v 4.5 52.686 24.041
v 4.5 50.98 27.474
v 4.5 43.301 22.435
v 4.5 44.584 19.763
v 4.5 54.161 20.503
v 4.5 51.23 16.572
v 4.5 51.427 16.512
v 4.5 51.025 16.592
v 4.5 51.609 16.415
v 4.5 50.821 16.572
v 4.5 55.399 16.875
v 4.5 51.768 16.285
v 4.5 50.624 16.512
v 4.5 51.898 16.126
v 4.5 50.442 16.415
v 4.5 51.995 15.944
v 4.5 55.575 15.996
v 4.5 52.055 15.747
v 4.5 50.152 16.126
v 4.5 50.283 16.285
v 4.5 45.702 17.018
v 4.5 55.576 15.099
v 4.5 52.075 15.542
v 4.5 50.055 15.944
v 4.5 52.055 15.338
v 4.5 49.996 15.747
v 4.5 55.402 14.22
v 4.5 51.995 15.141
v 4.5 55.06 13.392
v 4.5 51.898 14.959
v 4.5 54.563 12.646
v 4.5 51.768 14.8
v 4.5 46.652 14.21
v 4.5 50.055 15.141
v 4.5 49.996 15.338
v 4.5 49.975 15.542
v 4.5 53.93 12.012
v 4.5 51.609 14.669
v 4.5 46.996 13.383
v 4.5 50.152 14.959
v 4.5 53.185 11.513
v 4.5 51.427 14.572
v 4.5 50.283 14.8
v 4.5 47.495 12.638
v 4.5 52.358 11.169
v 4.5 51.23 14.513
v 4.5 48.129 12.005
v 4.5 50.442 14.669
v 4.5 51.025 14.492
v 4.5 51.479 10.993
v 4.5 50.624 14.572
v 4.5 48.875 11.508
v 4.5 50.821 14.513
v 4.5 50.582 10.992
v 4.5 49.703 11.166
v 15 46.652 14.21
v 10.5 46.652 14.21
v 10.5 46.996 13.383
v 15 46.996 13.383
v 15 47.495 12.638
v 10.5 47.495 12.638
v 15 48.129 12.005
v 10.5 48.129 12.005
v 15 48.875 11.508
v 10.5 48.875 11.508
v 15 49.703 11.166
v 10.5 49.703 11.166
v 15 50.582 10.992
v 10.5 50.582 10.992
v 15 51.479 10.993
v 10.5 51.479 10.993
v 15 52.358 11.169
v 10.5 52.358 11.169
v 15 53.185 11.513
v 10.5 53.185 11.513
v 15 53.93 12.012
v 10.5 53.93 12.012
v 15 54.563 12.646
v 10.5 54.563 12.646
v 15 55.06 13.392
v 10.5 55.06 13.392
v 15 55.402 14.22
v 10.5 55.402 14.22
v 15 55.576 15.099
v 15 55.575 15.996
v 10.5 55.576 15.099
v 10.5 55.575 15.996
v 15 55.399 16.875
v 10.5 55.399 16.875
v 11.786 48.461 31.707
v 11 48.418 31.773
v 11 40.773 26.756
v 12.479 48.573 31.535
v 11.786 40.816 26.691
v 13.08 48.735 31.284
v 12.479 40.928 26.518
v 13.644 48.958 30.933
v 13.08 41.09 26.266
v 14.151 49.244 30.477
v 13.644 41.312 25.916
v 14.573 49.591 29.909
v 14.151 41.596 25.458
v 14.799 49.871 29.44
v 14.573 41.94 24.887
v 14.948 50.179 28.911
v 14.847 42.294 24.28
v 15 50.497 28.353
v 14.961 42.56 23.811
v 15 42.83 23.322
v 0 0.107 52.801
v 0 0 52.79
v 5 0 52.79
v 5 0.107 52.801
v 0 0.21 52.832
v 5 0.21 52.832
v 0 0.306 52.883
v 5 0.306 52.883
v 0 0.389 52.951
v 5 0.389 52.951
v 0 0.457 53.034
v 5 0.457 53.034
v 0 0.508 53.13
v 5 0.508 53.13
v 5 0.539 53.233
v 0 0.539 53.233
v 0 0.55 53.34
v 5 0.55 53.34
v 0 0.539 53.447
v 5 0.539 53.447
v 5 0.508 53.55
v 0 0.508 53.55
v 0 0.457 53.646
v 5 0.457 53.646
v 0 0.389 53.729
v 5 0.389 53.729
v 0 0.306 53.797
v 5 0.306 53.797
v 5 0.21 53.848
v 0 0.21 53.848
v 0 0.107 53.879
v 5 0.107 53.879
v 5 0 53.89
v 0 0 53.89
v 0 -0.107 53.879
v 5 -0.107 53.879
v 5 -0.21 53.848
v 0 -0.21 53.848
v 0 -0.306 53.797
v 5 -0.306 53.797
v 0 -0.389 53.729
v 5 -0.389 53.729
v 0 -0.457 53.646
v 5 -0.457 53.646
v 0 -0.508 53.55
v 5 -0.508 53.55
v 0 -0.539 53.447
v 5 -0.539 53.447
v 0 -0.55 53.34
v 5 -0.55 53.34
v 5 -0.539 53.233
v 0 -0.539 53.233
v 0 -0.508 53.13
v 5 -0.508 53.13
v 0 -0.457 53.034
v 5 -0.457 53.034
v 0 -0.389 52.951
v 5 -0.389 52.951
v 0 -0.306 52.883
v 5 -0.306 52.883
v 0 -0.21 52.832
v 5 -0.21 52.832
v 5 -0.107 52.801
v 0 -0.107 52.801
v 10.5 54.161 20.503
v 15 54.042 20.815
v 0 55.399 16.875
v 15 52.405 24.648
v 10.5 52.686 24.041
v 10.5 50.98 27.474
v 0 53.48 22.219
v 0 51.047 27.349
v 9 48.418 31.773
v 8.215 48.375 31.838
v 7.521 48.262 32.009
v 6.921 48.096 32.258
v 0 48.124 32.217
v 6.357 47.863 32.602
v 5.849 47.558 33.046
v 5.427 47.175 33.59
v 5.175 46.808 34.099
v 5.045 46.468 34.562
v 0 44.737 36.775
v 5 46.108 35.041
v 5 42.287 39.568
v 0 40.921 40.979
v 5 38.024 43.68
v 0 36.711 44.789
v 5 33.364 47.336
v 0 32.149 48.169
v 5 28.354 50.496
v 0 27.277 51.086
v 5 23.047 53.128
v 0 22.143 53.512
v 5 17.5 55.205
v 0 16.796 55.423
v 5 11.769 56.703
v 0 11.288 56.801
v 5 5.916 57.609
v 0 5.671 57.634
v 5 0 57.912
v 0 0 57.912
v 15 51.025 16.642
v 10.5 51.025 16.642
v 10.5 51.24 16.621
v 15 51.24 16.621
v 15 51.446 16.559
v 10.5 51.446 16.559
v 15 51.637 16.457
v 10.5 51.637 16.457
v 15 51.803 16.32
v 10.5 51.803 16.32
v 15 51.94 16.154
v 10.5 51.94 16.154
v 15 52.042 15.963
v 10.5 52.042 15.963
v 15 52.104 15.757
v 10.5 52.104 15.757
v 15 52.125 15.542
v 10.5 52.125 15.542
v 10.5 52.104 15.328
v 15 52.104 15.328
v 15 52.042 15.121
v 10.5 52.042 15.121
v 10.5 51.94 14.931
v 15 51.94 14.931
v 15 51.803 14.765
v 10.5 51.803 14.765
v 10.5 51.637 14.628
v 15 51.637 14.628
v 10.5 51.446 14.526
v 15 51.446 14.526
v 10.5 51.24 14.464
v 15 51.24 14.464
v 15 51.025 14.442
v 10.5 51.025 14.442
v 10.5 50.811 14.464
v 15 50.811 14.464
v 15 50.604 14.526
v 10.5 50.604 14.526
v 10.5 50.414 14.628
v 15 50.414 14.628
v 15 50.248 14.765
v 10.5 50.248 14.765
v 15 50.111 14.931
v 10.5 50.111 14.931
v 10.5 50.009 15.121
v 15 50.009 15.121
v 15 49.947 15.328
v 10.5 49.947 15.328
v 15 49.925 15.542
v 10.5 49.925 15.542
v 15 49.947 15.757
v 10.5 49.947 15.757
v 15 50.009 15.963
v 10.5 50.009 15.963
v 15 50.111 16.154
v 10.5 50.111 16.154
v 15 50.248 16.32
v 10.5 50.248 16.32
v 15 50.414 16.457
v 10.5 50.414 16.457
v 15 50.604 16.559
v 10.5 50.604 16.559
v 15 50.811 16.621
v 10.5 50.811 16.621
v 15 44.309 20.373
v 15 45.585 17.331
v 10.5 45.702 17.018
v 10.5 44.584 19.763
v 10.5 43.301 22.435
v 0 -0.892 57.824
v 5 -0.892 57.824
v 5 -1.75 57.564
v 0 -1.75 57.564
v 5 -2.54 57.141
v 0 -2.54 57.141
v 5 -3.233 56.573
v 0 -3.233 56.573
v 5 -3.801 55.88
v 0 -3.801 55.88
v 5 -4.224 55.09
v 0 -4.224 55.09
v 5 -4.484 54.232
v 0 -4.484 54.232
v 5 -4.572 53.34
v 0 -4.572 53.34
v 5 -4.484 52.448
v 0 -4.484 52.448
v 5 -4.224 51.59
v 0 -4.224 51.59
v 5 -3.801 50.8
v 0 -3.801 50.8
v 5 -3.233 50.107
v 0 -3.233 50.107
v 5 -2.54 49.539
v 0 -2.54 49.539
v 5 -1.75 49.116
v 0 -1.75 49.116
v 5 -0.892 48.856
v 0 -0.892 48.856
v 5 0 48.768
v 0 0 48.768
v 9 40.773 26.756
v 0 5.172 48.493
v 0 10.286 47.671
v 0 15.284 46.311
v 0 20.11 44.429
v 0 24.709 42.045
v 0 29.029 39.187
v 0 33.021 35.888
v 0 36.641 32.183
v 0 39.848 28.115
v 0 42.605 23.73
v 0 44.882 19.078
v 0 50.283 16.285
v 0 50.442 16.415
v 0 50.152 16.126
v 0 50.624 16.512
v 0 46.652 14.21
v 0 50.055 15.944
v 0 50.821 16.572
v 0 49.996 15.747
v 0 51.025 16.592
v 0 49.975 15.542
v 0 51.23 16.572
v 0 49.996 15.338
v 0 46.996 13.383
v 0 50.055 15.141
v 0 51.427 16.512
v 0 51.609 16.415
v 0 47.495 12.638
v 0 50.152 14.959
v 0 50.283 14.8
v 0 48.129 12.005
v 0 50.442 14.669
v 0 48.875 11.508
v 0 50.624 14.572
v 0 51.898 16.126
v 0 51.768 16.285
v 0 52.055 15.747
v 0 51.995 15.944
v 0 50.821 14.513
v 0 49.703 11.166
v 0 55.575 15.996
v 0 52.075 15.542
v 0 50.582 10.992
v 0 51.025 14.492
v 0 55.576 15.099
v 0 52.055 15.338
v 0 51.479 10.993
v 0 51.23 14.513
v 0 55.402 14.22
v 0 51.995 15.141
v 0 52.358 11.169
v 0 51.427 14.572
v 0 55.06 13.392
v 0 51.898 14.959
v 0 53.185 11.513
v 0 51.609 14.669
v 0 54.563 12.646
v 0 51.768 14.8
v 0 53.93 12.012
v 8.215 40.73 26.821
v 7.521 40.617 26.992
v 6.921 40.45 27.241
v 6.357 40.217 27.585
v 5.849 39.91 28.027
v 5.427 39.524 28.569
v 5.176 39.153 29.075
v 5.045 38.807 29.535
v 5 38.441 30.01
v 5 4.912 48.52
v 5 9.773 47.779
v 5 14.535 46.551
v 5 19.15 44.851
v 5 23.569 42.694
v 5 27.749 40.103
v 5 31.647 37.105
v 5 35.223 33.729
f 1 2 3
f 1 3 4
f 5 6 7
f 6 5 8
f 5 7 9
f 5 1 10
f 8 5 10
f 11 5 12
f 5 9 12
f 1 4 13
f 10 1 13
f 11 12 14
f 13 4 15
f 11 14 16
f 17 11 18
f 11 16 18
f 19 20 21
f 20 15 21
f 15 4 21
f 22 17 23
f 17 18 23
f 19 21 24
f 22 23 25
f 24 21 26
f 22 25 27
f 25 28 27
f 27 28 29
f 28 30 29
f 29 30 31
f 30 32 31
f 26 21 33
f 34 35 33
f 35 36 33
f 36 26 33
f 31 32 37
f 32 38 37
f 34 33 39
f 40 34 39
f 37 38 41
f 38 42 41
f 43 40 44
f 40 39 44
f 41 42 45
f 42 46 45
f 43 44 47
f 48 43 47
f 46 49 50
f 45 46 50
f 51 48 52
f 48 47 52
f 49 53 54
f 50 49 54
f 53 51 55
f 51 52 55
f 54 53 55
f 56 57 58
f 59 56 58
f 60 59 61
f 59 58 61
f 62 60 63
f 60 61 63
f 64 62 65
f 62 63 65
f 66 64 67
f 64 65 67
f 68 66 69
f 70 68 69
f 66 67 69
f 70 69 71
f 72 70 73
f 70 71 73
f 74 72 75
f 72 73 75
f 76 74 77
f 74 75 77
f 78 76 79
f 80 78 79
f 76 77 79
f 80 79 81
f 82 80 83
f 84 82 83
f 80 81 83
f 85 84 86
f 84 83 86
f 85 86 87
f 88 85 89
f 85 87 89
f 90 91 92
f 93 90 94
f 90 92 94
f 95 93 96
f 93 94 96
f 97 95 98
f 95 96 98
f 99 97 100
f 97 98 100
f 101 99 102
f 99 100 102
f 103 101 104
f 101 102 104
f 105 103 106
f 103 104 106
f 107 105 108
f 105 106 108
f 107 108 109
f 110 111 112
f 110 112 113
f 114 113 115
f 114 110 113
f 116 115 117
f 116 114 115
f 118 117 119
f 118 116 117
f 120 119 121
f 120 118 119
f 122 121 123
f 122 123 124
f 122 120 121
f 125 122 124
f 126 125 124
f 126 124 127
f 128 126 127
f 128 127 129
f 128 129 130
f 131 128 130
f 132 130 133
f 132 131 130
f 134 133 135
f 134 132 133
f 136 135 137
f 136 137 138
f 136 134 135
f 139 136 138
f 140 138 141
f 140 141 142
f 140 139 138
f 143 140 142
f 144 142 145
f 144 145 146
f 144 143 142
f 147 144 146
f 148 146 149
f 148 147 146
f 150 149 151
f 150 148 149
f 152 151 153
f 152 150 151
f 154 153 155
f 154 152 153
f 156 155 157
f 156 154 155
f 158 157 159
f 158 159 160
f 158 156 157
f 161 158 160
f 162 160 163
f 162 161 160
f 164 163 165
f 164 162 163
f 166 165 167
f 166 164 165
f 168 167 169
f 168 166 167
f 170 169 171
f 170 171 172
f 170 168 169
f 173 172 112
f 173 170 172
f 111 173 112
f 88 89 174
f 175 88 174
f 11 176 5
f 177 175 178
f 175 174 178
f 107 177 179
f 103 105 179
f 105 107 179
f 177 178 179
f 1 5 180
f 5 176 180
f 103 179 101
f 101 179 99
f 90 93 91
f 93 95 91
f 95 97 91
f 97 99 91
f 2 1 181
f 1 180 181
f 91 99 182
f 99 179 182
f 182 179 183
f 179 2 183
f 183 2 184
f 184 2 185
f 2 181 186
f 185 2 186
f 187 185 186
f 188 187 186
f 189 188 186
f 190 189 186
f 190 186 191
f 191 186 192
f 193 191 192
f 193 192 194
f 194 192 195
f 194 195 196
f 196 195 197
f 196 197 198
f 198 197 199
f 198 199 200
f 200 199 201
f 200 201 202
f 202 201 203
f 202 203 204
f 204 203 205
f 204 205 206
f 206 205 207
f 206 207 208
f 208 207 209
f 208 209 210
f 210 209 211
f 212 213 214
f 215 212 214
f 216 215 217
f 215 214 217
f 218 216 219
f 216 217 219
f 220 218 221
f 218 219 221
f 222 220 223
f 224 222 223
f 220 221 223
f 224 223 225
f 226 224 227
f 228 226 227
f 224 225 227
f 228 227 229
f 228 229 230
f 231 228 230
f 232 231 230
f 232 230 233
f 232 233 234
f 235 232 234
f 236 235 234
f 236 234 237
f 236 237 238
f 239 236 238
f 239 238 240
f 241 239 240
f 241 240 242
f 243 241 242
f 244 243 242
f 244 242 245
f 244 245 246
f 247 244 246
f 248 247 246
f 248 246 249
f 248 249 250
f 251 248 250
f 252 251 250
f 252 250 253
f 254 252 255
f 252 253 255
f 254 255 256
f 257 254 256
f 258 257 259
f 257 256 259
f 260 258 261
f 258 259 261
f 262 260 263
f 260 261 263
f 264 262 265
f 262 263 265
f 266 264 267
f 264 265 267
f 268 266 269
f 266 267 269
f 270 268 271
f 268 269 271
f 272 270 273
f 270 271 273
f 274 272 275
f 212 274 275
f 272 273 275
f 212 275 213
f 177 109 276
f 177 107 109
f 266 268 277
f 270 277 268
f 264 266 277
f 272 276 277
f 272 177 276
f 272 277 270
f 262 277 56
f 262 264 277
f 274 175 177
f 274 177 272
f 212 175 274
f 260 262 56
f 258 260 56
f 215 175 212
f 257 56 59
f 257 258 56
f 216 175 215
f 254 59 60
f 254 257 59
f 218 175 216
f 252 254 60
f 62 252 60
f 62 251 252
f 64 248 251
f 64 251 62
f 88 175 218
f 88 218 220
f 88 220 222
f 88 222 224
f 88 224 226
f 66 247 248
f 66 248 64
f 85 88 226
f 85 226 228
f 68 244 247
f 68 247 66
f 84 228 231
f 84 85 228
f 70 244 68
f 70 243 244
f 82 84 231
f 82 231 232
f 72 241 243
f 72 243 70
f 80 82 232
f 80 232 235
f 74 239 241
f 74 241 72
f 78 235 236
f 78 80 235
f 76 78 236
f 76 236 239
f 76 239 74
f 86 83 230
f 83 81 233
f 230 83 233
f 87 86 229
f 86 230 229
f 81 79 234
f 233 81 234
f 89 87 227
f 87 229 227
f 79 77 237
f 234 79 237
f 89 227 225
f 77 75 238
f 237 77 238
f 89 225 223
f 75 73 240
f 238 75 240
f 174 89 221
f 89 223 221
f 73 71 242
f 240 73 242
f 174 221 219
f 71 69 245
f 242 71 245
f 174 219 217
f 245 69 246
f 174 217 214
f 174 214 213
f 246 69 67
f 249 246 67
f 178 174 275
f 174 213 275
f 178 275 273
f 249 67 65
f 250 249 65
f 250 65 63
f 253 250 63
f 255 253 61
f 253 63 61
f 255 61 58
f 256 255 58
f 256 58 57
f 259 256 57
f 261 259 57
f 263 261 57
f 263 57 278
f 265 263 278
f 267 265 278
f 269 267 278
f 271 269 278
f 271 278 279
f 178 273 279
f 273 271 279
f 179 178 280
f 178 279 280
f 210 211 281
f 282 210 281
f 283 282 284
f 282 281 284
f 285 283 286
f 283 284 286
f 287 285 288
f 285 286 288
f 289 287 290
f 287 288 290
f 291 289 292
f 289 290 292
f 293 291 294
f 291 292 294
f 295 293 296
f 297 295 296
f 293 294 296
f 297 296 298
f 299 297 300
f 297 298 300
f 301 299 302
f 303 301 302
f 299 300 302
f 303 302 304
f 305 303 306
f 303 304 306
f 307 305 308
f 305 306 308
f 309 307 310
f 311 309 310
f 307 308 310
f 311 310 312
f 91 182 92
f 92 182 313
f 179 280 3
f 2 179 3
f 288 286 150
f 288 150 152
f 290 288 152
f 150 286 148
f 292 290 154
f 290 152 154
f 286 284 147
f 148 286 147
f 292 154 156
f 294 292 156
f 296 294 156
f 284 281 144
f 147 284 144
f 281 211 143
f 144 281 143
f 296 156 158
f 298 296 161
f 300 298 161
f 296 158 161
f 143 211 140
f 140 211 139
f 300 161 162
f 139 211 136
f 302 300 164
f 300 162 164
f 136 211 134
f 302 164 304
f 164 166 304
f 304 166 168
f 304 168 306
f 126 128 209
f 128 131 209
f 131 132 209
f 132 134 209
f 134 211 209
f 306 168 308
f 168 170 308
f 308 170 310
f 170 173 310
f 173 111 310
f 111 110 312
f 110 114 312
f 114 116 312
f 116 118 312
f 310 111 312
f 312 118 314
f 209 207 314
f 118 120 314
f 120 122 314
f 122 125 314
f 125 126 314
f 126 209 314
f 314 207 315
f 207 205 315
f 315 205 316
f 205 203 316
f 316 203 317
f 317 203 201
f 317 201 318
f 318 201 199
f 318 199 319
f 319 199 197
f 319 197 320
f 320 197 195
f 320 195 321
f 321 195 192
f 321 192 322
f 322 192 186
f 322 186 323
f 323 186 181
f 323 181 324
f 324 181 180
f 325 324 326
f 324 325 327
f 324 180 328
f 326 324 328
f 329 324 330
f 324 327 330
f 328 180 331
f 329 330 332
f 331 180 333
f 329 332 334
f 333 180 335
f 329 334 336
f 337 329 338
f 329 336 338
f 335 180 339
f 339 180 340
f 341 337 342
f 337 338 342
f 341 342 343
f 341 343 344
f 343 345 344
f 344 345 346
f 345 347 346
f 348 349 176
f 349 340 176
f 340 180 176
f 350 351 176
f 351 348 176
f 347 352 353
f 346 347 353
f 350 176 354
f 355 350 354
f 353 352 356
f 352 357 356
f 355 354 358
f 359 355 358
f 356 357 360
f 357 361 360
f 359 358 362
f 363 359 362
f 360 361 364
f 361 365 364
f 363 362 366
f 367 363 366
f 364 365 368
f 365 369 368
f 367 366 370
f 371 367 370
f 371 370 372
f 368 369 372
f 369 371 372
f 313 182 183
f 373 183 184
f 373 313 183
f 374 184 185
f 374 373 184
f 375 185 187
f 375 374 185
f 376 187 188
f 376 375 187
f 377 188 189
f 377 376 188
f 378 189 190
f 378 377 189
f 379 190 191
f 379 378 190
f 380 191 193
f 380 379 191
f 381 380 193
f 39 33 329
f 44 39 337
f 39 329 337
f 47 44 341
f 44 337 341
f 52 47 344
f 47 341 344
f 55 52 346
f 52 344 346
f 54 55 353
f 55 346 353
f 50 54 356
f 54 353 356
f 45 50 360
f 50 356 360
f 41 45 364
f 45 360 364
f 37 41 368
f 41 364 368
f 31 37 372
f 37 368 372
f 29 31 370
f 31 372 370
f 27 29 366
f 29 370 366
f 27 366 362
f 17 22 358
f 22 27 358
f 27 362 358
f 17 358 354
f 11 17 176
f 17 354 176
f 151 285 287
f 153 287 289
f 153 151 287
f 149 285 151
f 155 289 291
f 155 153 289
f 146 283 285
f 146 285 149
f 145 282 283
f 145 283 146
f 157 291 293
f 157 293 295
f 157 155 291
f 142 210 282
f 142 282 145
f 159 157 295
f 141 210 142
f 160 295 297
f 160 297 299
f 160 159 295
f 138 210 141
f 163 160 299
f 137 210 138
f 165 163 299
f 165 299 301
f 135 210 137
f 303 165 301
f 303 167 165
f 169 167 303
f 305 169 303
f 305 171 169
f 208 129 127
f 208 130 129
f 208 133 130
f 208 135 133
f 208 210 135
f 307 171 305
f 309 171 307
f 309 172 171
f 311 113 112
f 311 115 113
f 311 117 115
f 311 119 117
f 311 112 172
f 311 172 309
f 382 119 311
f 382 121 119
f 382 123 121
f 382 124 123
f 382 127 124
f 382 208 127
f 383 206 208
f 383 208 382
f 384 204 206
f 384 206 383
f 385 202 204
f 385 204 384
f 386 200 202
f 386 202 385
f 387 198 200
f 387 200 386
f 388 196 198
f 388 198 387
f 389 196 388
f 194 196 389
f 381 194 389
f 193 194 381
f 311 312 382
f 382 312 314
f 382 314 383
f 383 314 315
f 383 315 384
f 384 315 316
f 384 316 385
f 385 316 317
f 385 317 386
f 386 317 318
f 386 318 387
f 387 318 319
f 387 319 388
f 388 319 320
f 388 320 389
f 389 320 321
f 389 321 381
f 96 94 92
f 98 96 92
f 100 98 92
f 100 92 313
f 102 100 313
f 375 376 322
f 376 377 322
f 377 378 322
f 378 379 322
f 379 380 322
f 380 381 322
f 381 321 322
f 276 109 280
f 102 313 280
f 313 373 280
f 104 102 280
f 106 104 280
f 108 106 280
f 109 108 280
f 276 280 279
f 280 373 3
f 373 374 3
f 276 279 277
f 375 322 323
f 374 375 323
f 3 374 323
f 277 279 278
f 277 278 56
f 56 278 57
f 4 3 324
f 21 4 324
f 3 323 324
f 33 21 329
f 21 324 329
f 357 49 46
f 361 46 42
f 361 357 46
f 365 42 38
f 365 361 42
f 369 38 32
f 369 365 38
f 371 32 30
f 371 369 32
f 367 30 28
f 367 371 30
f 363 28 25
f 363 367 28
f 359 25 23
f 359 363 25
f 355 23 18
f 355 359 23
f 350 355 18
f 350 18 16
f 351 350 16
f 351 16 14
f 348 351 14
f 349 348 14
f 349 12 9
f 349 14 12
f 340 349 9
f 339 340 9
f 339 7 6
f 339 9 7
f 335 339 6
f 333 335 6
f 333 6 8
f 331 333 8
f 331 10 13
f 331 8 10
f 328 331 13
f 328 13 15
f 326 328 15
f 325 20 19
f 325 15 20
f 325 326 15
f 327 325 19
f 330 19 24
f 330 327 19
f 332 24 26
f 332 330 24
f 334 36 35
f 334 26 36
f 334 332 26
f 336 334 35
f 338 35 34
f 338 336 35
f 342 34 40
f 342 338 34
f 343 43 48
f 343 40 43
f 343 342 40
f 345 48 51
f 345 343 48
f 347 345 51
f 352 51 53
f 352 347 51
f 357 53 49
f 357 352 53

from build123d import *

# Parameters (mm, degrees)
ESQUISSE1_R                  = 0.550000000000003
ESQUISSE1_R_2                = 1.050000000000001
BOSS_EXTRU_1_DEPTH           = 5
BOSS_EXTRU_2_DEPTH           = 10
ENL_V_MAT_EXTRU_1_DEPTH      = 61.96067460568836
ENL_V_MAT_EXTRU_1_DEPTH_BACK = 61.96067460568836
CONG_1_R                     = 4
ESQUISSE4_R                  = 1.0999999999999948
ENL_V_MAT_EXTRU_2_DEPTH      = 81.96368978508603


with BuildPart() as part:
    # Esquisse1 → Boss.-Extru.1 (new body)
    with BuildSketch(Plane(origin=(0, 0, 0), x_dir=(0, 0, -1), z_dir=(1, 0, 0))):
        with BuildLine():
            ThreePointArc((-48.767999999999994, 0), (-39.18749628154784, 29.028571428571436), (-14.210176870748295, 46.65178128755695))
            ThreePointArc((-14.210176870748295, 46.65178128755695), (-11.168776456672475, 52.35758986489808), (-16.874585034013602, 55.39899027897389))
            ThreePointArc((-16.874585034013602, 55.39899027897389), (-46.53515183433805, 34.47142857142858), (-57.91199999999999, 0))
            ThreePointArc((-57.91199999999999, 0), (-53.339999999999996, -4.571999999999996), (-48.767999999999994, 0))
        make_face()
        with Locations((-53.339999999999996, 0)):
            Circle(ESQUISSE1_R, mode=Mode.SUBTRACT)
        with Locations((-15.542380952380952, 51.02538578326543)):
            Circle(ESQUISSE1_R_2, mode=Mode.SUBTRACT)
    extrude(amount=BOSS_EXTRU_1_DEPTH)

    # Esquisse2 → Boss.-Extru.2 (add)
    with BuildSketch(Plane(origin=(5, 0, 0), x_dir=(0, 0, -1), z_dir=(1, 0, 0))):
        with BuildLine():
            Line((-31.772627007894677, 48.41797101301542), (-26.755896427700776, 40.77302822148666))
            ThreePointArc((-26.755896427700776, 40.77302822148666), (-20.692866519079303, 44.16019813388031), (-14.210176870748292, 46.65178128755695))
            ThreePointArc((-14.210176870748292, 46.65178128755695), (-11.168776456672475, 52.35758986489808), (-16.874585034013602, 55.3989902789739))
            ThreePointArc((-16.874585034013602, 55.3989902789739), (-24.57277899140668, 52.44023528398287), (-31.772627007894677, 48.41797101301542))
        make_face()
    extrude(amount=BOSS_EXTRU_2_DEPTH)

    # Esquisse3 → Enlèv. mat.-Extru.1 (cut, two sides: drawn at the far end of the back side and taken through both)
    with BuildSketch(Plane(origin=(-2.205e-14, 48.41797101301542, 31.77262700789469), x_dir=(-1, 0, -6.9e-16), z_dir=(0, 0.836061110184684, 0.5486363276677492)).offset(-ENL_V_MAT_EXTRU_1_DEPTH_BACK)):
        Polygon((-4.500000000000018, -21.069257970907522), (-10.500000000000023, -21.069257970907522), (-10.500000000000023, -5.000000000000025), (-4.500000000000011, -5.0000000000000195), align=None)
    extrude(amount=ENL_V_MAT_EXTRU_1_DEPTH + ENL_V_MAT_EXTRU_1_DEPTH_BACK, mode=Mode.SUBTRACT)

    # Congé1
    cong_1_edges = [part.edges().sort_by_distance(p)[0] for p in [
        (5, 44.595499617251036, 29.264261717797726),
        (15, 44.595499617251036, 29.264261717797726),
    ]]
    fillet(cong_1_edges, radius=CONG_1_R)

    # Esquisse4 → Enlèv. mat.-Extru.2 (cut, through all)
    with BuildSketch(Plane.ZY.offset(-10.500000000000023)):
        with Locations((15.542380952380947, 51.02538578326543)):
            Circle(ESQUISSE4_R)
    extrude(amount=-ENL_V_MAT_EXTRU_2_DEPTH, mode=Mode.SUBTRACT)


solid = part.part
